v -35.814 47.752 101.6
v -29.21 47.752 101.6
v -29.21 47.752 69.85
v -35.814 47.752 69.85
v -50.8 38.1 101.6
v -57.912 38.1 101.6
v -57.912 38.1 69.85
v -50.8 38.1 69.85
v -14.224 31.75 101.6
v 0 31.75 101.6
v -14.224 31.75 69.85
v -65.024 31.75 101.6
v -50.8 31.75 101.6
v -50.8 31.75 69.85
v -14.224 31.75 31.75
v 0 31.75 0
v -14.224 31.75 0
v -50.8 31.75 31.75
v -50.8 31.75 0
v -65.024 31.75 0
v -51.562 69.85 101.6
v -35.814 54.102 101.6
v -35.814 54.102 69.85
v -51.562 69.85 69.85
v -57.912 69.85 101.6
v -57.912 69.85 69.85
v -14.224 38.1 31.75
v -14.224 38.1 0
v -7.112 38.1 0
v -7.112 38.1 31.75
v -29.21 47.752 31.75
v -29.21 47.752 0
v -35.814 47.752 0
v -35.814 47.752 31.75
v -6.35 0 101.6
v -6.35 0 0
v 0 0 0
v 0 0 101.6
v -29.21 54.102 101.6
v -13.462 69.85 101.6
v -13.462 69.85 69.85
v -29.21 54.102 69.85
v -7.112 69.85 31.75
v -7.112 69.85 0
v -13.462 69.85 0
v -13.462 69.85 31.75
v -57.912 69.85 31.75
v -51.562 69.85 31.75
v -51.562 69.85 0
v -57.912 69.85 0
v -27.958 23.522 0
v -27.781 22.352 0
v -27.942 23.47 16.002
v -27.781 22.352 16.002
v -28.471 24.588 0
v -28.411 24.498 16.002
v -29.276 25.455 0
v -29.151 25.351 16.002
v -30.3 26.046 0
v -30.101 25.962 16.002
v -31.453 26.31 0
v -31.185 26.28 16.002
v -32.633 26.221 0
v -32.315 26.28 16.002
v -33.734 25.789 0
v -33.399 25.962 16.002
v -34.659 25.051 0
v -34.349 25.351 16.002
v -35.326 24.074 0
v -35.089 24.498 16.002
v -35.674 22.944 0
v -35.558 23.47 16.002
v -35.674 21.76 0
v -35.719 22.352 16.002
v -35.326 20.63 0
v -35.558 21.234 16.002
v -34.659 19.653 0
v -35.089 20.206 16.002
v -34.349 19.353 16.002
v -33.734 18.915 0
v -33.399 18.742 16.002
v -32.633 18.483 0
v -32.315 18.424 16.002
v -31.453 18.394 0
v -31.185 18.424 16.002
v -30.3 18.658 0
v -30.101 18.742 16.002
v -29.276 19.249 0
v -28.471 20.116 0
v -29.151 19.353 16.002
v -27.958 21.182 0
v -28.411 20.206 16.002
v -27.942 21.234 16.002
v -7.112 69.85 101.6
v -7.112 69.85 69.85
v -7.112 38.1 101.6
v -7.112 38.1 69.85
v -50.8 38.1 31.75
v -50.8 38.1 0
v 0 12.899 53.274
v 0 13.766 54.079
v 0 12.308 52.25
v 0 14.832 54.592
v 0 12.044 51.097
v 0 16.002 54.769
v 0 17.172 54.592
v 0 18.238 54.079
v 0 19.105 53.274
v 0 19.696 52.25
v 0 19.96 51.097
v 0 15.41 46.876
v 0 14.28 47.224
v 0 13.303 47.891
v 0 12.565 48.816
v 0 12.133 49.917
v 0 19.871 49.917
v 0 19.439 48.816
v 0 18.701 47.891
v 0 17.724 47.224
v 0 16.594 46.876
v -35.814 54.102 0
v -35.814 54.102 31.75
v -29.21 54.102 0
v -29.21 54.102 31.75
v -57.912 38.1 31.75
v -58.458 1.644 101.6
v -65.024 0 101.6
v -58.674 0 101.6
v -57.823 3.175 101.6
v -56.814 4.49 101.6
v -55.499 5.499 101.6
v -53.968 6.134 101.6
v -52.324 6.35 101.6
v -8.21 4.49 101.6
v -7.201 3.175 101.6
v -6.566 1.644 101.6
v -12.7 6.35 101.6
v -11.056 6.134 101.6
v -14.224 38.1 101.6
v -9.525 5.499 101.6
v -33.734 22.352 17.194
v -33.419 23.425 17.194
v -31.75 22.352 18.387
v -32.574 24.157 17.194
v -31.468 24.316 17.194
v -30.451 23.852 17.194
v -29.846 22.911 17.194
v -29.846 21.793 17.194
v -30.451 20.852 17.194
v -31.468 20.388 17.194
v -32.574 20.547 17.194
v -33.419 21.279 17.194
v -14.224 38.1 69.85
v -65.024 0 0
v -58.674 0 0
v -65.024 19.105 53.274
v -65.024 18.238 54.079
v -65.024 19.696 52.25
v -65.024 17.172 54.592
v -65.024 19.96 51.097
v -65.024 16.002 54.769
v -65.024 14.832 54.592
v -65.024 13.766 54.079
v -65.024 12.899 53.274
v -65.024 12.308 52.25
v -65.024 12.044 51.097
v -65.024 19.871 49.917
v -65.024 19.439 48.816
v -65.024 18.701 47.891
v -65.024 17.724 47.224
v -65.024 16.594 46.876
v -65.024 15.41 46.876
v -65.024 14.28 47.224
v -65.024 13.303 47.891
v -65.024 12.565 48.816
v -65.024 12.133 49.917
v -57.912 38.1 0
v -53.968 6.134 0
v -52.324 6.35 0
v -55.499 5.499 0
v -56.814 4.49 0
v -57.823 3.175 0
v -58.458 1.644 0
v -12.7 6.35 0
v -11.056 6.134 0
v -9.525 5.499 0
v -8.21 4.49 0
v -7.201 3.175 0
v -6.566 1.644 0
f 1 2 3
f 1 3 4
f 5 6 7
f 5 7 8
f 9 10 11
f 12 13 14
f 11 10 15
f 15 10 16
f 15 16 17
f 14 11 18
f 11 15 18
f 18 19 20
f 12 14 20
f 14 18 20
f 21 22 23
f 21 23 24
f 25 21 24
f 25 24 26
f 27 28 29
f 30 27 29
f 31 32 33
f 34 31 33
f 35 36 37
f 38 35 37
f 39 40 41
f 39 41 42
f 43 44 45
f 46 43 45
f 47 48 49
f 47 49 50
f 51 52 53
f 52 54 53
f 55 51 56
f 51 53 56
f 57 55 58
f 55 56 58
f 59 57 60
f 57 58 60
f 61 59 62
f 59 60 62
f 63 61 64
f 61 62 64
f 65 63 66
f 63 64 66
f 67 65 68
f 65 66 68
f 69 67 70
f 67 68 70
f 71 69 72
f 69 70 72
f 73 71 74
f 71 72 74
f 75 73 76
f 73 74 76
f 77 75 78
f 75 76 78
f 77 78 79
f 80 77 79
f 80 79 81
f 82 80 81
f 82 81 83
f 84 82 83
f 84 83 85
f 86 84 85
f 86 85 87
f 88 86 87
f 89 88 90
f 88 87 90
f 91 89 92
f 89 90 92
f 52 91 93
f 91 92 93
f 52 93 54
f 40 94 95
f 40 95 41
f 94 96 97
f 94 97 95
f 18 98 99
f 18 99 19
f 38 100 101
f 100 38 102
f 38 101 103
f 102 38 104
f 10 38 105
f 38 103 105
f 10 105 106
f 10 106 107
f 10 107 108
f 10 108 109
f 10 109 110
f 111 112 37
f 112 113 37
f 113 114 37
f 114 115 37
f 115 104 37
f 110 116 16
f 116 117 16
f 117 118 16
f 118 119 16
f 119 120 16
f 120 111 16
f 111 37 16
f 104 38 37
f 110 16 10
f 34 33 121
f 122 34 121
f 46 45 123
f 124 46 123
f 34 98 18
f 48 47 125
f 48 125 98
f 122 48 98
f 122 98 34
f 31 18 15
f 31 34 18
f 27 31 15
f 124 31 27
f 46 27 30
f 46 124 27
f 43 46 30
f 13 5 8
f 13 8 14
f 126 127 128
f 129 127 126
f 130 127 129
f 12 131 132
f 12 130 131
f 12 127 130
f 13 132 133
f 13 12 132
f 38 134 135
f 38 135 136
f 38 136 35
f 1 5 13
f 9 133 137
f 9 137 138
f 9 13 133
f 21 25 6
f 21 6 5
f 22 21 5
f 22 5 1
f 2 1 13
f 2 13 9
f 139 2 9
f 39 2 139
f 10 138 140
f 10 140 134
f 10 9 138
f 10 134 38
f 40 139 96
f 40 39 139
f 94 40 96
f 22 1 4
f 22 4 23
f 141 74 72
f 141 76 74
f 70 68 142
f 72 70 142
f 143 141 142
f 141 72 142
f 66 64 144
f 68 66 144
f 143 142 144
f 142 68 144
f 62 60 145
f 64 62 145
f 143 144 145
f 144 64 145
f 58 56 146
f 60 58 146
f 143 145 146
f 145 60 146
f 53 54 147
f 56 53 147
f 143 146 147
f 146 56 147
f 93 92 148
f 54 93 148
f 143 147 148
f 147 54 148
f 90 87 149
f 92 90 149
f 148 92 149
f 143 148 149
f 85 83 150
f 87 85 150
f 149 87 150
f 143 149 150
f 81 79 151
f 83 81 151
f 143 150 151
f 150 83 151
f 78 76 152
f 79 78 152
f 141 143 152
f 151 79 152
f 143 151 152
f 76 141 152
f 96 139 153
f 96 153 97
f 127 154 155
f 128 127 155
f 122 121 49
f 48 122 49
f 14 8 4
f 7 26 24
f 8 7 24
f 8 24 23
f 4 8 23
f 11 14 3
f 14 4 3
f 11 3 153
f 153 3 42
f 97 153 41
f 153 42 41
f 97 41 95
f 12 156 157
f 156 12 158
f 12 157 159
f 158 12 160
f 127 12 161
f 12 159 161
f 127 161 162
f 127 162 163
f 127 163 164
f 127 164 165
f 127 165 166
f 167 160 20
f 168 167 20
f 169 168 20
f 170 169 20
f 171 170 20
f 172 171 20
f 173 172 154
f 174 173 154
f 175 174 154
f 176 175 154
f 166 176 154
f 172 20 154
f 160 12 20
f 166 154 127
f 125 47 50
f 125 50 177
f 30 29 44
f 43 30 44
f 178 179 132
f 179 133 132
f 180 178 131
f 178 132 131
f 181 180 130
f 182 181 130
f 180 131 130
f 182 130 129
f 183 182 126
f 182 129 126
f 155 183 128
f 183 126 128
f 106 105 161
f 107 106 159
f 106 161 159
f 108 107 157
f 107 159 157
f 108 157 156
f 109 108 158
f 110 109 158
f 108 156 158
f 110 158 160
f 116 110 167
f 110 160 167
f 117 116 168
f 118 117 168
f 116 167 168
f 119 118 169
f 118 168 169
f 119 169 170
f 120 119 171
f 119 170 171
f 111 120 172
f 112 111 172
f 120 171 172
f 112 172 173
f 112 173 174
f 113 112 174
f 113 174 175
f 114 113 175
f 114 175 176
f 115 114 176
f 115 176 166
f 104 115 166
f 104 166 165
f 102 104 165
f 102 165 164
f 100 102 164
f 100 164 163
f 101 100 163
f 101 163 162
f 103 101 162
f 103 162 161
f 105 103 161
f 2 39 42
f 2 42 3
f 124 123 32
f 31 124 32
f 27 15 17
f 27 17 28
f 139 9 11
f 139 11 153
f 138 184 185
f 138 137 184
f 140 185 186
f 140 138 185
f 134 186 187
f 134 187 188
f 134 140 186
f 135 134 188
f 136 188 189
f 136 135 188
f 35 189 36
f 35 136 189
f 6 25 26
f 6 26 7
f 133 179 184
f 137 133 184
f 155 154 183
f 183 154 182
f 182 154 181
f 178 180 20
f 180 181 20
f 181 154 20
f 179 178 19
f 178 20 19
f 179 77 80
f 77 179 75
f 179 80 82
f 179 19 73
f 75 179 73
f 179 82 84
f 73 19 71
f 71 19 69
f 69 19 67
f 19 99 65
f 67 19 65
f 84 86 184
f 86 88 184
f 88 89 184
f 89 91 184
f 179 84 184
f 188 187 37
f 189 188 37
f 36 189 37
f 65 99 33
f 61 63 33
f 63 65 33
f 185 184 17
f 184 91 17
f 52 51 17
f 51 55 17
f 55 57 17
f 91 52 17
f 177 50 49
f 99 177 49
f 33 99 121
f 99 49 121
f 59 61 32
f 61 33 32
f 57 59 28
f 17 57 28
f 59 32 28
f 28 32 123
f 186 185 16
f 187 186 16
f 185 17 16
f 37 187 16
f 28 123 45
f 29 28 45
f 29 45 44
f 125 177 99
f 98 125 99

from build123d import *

# Parameters (mm, degrees)
BOSS_EXTRUDE1_DEPTH         = 101.6
FILLET1_R                   = 6.35
FILLET2_R                   = 6.35
F_3_8_16_TAPPED_HOLE3_D     = 7.9375
F_3_8_16_TAPPED_HOLE3_DEPTH = 16.002
F_3_8_16_TAPPED_HOLE3_TIP   = 2.384665582
F_3_8_16_TAPPED_HOLE4_D     = 7.9375
BOSS_EXTRUDE2_DEPTH         = 31.75


with BuildPart() as part:
    # Sketch1 → Boss-Extrude1 (new body)
    with BuildSketch(Plane.XY):
        Polygon((-58.674, 0), (-58.674, 6.35), (-6.35, 6.35), (-6.35, 0), (0, 0), (0, 31.75), (-65.024, 31.75), (-65.024, 0), align=None)
    extrude(amount=BOSS_EXTRUDE1_DEPTH)

    # Fillet1
    fillet1_edges = [part.edges().sort_by_distance(p)[0] for p in [
        (-6.35, 6.35, 50.8),
    ]]
    fillet(fillet1_edges, radius=FILLET1_R - 0.0001)  # a hair under: the kernel refuses the full size

    # Fillet2
    fillet2_edges = [part.edges().sort_by_distance(p)[0] for p in [
        (-58.674, 6.35, 50.8),
    ]]
    fillet(fillet2_edges, radius=FILLET2_R - 0.0001)  # a hair under: the kernel refuses the full size

    # 3/8-16 Tapped Hole3
    with Locations(Plane(origin=(0, 0, 0), x_dir=(-1, 0, 0), z_dir=(0, 0, -1))):
        with Locations((31.75, 22.352)):
            Hole(F_3_8_16_TAPPED_HOLE3_D / 2, depth=F_3_8_16_TAPPED_HOLE3_DEPTH)
            with Locations((0, 0, -(F_3_8_16_TAPPED_HOLE3_DEPTH + F_3_8_16_TAPPED_HOLE3_TIP / 2))):  # 118° drill point
                Cone(0, F_3_8_16_TAPPED_HOLE3_D / 2, F_3_8_16_TAPPED_HOLE3_TIP, mode=Mode.SUBTRACT)

    # 3/8-16 Tapped Hole4 (through all)
    with Locations(Plane(origin=(0, 0, 0), x_dir=(0, 0, -1), z_dir=(1, 0, 0))):
        with Locations((-50.8, 16.002)):
            Hole(F_3_8_16_TAPPED_HOLE4_D / 2)

    # Sketch13 → Boss-Extrude2 (add)
    with BuildSketch(Plane.XY):
        Polygon((-14.224, 31.75), (-14.224, 38.1), (-7.112, 38.1), (-7.112, 69.85), (-13.462, 69.85), (-29.21, 54.102), (-29.21, 47.752), (-35.814, 47.752), (-35.814, 54.102), (-51.562, 69.85), (-57.912, 69.85), (-57.912, 38.1), (-50.8, 38.1), (-50.8, 31.75), align=None)
    boss_extrude2 = extrude(amount=BOSS_EXTRUDE2_DEPTH)

    # Mirror1: Boss-Extrude2 across plane
    add(boss_extrude2.mirror(Plane.XY.offset(50.8)))


solid = part.part
